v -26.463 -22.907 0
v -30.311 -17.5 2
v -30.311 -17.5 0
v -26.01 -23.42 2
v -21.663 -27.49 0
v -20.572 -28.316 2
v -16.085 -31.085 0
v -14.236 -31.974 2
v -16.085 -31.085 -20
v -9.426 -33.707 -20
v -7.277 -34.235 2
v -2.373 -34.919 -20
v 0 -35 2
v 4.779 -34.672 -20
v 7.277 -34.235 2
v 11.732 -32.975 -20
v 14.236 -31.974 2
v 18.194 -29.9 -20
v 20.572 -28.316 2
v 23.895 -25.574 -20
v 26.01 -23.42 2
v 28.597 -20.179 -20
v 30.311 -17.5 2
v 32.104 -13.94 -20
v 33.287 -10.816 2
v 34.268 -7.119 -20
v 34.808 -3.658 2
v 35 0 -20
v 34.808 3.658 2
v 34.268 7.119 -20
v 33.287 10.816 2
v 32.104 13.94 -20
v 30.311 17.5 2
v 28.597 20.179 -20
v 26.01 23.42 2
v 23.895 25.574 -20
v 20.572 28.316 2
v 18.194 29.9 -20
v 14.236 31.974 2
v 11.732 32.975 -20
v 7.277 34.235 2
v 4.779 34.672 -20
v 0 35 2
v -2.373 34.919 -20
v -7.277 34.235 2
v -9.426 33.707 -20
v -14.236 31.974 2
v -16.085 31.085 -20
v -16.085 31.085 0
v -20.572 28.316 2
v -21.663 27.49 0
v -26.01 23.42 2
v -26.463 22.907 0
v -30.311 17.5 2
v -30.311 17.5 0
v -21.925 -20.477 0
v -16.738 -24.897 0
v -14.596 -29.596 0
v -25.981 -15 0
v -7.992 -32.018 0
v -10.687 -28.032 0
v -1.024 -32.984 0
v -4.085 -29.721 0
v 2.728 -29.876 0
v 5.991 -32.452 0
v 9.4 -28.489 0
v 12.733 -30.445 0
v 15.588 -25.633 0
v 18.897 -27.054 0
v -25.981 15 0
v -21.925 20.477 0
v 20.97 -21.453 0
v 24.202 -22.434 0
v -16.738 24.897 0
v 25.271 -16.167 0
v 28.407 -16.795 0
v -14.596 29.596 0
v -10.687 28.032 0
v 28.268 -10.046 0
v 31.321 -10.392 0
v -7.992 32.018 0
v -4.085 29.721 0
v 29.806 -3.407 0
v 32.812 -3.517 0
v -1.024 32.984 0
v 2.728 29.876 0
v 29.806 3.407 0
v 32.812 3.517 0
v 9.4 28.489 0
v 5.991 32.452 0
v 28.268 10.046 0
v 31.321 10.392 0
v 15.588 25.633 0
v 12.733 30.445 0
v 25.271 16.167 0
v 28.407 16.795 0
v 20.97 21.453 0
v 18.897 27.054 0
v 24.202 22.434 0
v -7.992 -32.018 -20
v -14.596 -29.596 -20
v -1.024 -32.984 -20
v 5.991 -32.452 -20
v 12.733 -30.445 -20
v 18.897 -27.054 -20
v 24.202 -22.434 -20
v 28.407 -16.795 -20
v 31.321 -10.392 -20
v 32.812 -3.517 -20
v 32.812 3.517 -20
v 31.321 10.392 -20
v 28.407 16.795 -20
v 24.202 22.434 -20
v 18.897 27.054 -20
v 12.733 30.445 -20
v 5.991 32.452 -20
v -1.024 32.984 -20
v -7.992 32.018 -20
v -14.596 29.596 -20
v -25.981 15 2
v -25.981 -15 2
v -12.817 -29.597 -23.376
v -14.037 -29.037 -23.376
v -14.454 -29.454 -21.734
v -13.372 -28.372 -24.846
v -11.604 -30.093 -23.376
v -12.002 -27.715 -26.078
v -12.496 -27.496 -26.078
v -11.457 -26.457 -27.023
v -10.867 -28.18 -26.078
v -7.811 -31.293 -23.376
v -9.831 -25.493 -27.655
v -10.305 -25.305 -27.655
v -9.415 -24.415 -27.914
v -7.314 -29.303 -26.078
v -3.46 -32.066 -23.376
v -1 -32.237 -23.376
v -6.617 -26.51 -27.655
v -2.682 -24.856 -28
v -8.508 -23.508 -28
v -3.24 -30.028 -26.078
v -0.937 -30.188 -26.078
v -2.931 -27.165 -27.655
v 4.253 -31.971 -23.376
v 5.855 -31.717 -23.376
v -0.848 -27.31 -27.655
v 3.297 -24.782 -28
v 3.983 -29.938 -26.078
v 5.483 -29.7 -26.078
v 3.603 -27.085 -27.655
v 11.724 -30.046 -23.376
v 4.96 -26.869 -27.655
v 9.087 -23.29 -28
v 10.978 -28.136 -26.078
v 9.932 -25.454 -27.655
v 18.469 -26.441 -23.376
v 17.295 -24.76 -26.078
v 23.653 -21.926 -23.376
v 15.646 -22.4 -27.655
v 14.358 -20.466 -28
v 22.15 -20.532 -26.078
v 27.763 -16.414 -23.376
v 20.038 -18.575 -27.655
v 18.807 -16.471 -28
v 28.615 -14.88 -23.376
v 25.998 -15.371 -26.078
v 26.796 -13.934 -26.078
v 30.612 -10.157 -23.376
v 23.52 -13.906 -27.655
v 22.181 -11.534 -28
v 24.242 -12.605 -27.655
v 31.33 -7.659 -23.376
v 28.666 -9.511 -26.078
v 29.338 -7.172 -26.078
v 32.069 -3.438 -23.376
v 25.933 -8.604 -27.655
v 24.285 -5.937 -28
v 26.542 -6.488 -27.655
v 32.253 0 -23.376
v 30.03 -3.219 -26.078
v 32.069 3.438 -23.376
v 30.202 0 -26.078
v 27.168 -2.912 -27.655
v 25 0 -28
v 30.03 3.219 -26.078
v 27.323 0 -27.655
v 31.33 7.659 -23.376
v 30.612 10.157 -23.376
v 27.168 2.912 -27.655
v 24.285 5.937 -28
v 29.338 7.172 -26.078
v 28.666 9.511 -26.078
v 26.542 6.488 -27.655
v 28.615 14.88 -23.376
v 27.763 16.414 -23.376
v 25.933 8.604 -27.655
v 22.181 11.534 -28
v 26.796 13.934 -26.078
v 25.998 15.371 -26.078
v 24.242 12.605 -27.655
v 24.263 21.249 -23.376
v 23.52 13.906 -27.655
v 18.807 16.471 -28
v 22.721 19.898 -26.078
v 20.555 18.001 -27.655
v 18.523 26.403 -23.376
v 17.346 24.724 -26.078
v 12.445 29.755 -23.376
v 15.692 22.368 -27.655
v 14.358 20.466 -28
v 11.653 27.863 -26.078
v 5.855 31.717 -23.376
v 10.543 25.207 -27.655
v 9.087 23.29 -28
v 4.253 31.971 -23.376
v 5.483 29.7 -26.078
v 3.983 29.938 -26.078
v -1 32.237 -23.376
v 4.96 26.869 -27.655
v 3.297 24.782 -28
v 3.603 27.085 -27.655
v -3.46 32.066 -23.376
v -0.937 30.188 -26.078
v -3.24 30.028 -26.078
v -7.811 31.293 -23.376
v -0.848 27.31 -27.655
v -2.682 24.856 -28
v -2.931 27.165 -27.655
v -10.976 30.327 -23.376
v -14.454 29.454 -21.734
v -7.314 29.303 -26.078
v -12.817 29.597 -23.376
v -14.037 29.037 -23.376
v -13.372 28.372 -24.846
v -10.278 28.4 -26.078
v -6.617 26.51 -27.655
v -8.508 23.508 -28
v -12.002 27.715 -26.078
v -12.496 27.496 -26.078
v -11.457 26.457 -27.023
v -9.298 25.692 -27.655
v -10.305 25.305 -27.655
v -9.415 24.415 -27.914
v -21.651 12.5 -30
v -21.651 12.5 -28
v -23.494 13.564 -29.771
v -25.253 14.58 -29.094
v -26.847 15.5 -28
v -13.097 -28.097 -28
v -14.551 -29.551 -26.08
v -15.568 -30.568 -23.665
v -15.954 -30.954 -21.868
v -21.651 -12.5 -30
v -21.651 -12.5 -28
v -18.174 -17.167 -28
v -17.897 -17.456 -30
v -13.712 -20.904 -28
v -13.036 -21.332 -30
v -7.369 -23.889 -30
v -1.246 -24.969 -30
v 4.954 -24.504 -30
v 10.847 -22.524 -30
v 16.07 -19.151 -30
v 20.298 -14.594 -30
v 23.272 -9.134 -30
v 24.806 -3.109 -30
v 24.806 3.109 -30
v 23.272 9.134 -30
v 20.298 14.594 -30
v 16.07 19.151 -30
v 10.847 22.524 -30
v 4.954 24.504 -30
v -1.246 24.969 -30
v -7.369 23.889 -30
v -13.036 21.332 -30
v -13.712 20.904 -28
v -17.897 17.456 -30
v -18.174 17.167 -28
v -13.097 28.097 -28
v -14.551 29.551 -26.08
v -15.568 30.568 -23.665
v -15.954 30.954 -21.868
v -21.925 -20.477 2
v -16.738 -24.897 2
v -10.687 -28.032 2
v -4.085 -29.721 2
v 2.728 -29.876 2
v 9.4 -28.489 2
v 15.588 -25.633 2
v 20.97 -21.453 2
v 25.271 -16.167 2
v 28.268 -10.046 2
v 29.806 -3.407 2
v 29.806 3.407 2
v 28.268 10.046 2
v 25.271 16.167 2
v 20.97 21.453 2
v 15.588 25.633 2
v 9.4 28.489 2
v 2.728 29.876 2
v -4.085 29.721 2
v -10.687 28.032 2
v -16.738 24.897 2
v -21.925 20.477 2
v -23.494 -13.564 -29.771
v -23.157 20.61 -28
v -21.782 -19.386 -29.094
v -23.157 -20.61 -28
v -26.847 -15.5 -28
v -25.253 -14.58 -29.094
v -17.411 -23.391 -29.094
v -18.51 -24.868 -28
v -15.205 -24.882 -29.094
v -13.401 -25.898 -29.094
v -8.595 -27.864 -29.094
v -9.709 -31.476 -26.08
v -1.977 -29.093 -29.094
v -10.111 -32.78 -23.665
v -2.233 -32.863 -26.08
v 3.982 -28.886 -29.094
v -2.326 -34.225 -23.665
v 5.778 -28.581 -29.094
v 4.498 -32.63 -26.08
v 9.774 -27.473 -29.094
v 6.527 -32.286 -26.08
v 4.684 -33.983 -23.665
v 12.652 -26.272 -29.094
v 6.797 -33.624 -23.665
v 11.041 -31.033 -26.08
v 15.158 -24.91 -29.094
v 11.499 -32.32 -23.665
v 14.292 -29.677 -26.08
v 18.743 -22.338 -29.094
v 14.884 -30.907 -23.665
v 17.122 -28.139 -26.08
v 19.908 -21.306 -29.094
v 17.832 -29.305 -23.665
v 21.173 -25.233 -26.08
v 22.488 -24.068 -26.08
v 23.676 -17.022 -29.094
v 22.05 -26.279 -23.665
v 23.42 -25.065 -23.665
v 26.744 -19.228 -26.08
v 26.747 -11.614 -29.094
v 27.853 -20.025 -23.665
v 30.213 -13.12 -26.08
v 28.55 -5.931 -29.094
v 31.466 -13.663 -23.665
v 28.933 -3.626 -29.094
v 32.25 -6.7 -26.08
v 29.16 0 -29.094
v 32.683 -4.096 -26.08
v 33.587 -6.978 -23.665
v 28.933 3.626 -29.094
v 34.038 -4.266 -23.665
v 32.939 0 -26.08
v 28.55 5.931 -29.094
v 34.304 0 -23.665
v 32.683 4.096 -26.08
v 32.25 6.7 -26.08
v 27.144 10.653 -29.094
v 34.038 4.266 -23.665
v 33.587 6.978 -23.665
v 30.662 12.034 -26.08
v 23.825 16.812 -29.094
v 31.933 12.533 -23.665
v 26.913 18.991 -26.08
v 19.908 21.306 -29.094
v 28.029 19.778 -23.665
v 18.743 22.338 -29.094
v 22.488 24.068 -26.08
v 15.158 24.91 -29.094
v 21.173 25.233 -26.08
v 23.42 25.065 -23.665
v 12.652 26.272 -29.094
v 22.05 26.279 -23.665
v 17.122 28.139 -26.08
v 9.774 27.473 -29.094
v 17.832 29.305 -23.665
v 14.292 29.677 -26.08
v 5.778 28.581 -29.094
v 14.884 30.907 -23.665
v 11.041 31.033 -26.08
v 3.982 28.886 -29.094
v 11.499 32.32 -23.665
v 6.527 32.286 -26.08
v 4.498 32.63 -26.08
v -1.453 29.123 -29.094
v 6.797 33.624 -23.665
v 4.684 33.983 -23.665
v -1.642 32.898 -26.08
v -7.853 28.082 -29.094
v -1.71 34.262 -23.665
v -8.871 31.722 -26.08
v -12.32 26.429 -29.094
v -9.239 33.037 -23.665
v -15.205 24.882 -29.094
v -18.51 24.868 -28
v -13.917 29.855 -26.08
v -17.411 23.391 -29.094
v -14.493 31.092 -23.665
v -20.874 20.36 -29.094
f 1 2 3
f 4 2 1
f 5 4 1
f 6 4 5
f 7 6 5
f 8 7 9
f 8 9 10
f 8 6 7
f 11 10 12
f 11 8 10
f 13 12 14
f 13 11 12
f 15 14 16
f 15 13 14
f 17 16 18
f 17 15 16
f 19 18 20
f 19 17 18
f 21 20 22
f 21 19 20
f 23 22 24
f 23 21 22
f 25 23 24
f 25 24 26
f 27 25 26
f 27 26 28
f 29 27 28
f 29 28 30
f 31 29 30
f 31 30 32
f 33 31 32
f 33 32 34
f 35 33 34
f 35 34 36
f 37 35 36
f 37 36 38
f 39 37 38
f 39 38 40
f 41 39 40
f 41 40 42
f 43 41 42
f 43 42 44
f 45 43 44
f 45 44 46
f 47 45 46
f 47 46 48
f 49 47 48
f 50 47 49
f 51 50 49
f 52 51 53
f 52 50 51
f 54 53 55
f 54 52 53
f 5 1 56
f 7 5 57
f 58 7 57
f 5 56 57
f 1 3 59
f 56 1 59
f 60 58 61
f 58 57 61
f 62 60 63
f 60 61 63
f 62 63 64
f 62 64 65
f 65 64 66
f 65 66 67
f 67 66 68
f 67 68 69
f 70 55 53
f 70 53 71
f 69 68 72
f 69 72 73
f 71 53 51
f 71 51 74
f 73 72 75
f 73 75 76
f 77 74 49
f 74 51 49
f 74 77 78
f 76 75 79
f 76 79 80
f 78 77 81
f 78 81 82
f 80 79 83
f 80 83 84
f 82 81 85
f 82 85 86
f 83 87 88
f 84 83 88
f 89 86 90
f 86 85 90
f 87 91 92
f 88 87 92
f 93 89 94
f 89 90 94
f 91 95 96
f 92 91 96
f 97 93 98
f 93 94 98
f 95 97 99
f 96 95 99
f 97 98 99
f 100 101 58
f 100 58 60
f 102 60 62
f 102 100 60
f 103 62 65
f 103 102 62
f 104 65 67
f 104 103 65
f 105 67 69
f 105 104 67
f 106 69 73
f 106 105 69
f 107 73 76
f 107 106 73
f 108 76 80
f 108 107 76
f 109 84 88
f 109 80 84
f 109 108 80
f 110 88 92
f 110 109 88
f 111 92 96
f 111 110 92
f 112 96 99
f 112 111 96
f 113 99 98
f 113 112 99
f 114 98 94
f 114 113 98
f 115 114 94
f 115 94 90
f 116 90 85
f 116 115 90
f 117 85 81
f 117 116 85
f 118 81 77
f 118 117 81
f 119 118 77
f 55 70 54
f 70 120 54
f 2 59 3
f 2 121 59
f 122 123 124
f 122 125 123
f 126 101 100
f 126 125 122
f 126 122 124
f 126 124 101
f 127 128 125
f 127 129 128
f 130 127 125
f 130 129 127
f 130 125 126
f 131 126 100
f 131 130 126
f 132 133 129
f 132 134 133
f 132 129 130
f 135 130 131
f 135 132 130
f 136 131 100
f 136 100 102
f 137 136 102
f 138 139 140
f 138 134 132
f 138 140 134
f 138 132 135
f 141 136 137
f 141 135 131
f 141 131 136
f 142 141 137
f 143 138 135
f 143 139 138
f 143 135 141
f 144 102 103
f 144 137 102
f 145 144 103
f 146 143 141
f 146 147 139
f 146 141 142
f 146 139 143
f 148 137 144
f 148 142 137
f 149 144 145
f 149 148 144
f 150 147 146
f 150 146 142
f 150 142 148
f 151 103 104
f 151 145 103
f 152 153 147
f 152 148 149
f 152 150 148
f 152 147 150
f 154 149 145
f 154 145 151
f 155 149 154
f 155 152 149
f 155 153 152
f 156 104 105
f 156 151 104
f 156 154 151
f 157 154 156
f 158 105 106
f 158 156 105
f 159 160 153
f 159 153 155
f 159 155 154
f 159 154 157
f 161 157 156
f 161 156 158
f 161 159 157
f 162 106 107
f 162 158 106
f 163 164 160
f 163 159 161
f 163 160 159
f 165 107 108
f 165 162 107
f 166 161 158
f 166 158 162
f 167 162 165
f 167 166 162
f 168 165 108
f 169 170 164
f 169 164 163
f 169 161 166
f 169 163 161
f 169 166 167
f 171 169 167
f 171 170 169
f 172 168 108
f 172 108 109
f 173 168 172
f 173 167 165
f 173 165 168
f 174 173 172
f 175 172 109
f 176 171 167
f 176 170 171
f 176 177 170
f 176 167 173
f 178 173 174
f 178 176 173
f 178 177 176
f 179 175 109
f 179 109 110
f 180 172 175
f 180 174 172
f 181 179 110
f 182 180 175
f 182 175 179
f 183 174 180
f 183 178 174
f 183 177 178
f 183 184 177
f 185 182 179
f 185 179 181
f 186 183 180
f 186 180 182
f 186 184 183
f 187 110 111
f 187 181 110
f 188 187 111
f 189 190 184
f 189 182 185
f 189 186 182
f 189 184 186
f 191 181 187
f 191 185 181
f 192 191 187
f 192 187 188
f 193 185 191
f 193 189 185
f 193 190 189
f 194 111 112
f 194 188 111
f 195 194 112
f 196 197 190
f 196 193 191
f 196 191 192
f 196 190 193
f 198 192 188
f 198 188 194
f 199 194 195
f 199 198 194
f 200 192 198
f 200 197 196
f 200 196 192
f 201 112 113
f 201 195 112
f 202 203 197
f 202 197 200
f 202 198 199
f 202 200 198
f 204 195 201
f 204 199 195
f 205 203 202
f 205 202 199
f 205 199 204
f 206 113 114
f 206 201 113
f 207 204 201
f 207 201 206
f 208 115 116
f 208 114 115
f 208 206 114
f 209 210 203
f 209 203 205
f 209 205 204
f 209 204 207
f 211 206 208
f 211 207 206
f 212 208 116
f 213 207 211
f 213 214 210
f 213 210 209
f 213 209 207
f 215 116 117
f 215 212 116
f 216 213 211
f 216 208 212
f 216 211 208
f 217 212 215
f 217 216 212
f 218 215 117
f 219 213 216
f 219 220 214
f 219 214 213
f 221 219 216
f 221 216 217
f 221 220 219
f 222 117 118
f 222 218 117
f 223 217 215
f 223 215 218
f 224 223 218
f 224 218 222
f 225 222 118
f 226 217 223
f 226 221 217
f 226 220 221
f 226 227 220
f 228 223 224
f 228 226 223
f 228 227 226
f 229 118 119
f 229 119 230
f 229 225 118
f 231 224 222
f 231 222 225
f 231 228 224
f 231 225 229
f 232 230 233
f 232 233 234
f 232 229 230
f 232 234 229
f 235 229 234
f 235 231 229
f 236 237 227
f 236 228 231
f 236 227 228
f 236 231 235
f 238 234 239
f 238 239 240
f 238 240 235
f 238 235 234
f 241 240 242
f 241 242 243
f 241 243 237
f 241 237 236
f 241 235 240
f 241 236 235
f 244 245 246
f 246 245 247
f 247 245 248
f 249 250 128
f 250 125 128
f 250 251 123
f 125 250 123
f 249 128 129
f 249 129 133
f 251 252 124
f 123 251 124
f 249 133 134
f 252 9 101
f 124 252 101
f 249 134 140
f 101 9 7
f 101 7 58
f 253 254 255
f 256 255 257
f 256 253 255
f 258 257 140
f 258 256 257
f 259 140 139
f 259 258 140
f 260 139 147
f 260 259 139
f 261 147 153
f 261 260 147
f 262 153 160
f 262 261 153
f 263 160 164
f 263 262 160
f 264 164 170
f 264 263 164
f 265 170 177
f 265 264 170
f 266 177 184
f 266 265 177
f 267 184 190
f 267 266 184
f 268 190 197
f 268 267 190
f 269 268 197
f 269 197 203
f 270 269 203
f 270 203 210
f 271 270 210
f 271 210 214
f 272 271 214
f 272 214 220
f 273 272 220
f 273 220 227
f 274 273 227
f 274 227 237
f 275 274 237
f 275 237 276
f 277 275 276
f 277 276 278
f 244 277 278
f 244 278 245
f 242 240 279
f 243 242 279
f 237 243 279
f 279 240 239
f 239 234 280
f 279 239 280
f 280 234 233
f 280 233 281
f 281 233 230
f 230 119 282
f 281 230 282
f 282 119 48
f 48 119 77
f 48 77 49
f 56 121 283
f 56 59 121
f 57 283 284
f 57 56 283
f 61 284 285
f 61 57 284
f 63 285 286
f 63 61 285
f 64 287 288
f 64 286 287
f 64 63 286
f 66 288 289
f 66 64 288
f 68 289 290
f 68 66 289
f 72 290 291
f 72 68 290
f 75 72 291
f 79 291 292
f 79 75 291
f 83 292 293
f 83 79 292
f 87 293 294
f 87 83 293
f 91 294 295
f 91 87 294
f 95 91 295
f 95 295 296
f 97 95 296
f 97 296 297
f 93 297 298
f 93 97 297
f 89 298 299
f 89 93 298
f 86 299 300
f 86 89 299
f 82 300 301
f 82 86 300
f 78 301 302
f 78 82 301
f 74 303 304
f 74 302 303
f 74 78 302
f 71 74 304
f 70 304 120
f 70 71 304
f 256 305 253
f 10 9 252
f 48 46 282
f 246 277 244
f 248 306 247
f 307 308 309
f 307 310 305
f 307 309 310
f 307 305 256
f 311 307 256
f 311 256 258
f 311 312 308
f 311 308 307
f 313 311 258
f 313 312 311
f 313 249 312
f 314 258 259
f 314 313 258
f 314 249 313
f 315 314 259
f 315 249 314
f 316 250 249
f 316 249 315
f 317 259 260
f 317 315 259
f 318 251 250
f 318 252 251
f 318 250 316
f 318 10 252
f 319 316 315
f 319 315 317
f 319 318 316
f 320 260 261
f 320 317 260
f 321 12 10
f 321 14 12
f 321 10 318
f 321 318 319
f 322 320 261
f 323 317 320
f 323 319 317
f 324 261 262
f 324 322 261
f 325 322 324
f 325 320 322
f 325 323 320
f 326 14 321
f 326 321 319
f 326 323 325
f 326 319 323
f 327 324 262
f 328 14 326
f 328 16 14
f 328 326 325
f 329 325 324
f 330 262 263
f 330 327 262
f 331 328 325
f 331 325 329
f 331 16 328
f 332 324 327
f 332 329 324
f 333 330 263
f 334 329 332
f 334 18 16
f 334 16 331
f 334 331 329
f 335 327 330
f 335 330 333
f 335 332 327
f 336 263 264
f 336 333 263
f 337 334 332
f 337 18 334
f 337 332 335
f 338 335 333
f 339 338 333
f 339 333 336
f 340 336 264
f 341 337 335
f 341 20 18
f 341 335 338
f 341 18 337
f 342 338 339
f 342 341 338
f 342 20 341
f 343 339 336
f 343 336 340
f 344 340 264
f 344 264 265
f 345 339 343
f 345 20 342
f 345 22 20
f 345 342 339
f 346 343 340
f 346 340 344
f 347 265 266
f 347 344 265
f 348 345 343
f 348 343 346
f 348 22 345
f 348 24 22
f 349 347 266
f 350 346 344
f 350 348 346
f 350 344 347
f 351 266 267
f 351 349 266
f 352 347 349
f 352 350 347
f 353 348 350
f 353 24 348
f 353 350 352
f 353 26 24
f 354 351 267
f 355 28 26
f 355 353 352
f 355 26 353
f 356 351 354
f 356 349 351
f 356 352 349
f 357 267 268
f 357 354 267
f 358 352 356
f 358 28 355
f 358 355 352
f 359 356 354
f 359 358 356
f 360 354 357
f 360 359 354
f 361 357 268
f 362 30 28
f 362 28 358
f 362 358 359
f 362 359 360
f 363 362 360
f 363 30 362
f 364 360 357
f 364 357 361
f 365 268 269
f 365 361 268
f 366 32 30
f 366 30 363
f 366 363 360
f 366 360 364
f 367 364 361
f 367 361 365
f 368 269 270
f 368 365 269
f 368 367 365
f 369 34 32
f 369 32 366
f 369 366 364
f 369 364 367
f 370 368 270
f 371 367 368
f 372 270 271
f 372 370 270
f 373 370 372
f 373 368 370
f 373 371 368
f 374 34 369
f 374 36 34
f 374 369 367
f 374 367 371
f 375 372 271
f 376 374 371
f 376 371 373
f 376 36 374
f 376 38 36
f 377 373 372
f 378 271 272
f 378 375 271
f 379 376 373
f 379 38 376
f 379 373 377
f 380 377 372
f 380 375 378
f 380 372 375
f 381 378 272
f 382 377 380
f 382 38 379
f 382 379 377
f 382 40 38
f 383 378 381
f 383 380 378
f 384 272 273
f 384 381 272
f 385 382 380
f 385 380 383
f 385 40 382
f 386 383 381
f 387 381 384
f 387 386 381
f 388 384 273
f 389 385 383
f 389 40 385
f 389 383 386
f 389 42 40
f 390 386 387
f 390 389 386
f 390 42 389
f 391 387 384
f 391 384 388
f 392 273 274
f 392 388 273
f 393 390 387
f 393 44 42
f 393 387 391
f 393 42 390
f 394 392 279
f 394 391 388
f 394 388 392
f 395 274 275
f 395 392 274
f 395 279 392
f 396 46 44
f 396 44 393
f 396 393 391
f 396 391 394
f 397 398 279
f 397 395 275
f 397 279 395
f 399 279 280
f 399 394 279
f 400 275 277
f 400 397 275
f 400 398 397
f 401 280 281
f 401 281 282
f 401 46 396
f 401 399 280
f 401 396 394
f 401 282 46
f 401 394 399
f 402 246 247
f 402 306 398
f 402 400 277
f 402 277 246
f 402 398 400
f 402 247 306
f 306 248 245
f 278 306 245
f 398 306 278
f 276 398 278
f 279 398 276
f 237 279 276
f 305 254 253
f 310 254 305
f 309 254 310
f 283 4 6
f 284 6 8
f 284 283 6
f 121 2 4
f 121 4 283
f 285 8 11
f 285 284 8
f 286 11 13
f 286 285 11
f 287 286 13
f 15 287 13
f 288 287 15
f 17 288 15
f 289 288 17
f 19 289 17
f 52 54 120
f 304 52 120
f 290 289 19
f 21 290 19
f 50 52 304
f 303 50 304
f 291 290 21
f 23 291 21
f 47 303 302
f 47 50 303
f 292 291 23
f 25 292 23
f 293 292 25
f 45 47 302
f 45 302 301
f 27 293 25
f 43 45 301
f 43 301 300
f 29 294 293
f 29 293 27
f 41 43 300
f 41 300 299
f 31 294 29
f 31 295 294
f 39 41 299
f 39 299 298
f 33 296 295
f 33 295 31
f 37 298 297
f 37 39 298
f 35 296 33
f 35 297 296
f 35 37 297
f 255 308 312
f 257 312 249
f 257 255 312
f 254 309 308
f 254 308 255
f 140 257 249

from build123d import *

# Parameters (mm, degrees)
F1_ANGLE = 300
F3_DEPTH = 28


with BuildPart() as f1:
    # F0 (on Front) → F1 (revolve, symmetric)
    with BuildSketch(Plane.XZ) as f1_sk:
        with BuildLine():
            Line((35, -20), (35, 0))
            Line((35, 0), (35, 2))
            Line((35, 2), (30, 2))
            Line((30, 2), (30, 0))
            Line((30, 0), (33, 0))
            Line((33, 0), (33, -20))
            ThreePointArc((33, -20), (30.656854, -25.656854), (25, -28))
            Line((25, -28), (25, -30))
            ThreePointArc((25, -30), (32.071068, -27.071068), (35, -20))
        make_face()
    revolve(axis=Axis((0, 0, -15), (0, 0, -1)), revolution_arc=F1_ANGLE / 2)
    revolve(f1_sk.sketch, axis=Axis((0, 0, -15), (0, 0, 1)), revolution_arc=F1_ANGLE / 2)

    # F2 (on Top) → F3 (cut)
    with BuildSketch(Plane.XY):
        Polygon((-55, -70), (15, 0), (-55, 70), (-55, 0), align=None)
    extrude(amount=-F3_DEPTH, mode=Mode.SUBTRACT)


solid = f1.part
